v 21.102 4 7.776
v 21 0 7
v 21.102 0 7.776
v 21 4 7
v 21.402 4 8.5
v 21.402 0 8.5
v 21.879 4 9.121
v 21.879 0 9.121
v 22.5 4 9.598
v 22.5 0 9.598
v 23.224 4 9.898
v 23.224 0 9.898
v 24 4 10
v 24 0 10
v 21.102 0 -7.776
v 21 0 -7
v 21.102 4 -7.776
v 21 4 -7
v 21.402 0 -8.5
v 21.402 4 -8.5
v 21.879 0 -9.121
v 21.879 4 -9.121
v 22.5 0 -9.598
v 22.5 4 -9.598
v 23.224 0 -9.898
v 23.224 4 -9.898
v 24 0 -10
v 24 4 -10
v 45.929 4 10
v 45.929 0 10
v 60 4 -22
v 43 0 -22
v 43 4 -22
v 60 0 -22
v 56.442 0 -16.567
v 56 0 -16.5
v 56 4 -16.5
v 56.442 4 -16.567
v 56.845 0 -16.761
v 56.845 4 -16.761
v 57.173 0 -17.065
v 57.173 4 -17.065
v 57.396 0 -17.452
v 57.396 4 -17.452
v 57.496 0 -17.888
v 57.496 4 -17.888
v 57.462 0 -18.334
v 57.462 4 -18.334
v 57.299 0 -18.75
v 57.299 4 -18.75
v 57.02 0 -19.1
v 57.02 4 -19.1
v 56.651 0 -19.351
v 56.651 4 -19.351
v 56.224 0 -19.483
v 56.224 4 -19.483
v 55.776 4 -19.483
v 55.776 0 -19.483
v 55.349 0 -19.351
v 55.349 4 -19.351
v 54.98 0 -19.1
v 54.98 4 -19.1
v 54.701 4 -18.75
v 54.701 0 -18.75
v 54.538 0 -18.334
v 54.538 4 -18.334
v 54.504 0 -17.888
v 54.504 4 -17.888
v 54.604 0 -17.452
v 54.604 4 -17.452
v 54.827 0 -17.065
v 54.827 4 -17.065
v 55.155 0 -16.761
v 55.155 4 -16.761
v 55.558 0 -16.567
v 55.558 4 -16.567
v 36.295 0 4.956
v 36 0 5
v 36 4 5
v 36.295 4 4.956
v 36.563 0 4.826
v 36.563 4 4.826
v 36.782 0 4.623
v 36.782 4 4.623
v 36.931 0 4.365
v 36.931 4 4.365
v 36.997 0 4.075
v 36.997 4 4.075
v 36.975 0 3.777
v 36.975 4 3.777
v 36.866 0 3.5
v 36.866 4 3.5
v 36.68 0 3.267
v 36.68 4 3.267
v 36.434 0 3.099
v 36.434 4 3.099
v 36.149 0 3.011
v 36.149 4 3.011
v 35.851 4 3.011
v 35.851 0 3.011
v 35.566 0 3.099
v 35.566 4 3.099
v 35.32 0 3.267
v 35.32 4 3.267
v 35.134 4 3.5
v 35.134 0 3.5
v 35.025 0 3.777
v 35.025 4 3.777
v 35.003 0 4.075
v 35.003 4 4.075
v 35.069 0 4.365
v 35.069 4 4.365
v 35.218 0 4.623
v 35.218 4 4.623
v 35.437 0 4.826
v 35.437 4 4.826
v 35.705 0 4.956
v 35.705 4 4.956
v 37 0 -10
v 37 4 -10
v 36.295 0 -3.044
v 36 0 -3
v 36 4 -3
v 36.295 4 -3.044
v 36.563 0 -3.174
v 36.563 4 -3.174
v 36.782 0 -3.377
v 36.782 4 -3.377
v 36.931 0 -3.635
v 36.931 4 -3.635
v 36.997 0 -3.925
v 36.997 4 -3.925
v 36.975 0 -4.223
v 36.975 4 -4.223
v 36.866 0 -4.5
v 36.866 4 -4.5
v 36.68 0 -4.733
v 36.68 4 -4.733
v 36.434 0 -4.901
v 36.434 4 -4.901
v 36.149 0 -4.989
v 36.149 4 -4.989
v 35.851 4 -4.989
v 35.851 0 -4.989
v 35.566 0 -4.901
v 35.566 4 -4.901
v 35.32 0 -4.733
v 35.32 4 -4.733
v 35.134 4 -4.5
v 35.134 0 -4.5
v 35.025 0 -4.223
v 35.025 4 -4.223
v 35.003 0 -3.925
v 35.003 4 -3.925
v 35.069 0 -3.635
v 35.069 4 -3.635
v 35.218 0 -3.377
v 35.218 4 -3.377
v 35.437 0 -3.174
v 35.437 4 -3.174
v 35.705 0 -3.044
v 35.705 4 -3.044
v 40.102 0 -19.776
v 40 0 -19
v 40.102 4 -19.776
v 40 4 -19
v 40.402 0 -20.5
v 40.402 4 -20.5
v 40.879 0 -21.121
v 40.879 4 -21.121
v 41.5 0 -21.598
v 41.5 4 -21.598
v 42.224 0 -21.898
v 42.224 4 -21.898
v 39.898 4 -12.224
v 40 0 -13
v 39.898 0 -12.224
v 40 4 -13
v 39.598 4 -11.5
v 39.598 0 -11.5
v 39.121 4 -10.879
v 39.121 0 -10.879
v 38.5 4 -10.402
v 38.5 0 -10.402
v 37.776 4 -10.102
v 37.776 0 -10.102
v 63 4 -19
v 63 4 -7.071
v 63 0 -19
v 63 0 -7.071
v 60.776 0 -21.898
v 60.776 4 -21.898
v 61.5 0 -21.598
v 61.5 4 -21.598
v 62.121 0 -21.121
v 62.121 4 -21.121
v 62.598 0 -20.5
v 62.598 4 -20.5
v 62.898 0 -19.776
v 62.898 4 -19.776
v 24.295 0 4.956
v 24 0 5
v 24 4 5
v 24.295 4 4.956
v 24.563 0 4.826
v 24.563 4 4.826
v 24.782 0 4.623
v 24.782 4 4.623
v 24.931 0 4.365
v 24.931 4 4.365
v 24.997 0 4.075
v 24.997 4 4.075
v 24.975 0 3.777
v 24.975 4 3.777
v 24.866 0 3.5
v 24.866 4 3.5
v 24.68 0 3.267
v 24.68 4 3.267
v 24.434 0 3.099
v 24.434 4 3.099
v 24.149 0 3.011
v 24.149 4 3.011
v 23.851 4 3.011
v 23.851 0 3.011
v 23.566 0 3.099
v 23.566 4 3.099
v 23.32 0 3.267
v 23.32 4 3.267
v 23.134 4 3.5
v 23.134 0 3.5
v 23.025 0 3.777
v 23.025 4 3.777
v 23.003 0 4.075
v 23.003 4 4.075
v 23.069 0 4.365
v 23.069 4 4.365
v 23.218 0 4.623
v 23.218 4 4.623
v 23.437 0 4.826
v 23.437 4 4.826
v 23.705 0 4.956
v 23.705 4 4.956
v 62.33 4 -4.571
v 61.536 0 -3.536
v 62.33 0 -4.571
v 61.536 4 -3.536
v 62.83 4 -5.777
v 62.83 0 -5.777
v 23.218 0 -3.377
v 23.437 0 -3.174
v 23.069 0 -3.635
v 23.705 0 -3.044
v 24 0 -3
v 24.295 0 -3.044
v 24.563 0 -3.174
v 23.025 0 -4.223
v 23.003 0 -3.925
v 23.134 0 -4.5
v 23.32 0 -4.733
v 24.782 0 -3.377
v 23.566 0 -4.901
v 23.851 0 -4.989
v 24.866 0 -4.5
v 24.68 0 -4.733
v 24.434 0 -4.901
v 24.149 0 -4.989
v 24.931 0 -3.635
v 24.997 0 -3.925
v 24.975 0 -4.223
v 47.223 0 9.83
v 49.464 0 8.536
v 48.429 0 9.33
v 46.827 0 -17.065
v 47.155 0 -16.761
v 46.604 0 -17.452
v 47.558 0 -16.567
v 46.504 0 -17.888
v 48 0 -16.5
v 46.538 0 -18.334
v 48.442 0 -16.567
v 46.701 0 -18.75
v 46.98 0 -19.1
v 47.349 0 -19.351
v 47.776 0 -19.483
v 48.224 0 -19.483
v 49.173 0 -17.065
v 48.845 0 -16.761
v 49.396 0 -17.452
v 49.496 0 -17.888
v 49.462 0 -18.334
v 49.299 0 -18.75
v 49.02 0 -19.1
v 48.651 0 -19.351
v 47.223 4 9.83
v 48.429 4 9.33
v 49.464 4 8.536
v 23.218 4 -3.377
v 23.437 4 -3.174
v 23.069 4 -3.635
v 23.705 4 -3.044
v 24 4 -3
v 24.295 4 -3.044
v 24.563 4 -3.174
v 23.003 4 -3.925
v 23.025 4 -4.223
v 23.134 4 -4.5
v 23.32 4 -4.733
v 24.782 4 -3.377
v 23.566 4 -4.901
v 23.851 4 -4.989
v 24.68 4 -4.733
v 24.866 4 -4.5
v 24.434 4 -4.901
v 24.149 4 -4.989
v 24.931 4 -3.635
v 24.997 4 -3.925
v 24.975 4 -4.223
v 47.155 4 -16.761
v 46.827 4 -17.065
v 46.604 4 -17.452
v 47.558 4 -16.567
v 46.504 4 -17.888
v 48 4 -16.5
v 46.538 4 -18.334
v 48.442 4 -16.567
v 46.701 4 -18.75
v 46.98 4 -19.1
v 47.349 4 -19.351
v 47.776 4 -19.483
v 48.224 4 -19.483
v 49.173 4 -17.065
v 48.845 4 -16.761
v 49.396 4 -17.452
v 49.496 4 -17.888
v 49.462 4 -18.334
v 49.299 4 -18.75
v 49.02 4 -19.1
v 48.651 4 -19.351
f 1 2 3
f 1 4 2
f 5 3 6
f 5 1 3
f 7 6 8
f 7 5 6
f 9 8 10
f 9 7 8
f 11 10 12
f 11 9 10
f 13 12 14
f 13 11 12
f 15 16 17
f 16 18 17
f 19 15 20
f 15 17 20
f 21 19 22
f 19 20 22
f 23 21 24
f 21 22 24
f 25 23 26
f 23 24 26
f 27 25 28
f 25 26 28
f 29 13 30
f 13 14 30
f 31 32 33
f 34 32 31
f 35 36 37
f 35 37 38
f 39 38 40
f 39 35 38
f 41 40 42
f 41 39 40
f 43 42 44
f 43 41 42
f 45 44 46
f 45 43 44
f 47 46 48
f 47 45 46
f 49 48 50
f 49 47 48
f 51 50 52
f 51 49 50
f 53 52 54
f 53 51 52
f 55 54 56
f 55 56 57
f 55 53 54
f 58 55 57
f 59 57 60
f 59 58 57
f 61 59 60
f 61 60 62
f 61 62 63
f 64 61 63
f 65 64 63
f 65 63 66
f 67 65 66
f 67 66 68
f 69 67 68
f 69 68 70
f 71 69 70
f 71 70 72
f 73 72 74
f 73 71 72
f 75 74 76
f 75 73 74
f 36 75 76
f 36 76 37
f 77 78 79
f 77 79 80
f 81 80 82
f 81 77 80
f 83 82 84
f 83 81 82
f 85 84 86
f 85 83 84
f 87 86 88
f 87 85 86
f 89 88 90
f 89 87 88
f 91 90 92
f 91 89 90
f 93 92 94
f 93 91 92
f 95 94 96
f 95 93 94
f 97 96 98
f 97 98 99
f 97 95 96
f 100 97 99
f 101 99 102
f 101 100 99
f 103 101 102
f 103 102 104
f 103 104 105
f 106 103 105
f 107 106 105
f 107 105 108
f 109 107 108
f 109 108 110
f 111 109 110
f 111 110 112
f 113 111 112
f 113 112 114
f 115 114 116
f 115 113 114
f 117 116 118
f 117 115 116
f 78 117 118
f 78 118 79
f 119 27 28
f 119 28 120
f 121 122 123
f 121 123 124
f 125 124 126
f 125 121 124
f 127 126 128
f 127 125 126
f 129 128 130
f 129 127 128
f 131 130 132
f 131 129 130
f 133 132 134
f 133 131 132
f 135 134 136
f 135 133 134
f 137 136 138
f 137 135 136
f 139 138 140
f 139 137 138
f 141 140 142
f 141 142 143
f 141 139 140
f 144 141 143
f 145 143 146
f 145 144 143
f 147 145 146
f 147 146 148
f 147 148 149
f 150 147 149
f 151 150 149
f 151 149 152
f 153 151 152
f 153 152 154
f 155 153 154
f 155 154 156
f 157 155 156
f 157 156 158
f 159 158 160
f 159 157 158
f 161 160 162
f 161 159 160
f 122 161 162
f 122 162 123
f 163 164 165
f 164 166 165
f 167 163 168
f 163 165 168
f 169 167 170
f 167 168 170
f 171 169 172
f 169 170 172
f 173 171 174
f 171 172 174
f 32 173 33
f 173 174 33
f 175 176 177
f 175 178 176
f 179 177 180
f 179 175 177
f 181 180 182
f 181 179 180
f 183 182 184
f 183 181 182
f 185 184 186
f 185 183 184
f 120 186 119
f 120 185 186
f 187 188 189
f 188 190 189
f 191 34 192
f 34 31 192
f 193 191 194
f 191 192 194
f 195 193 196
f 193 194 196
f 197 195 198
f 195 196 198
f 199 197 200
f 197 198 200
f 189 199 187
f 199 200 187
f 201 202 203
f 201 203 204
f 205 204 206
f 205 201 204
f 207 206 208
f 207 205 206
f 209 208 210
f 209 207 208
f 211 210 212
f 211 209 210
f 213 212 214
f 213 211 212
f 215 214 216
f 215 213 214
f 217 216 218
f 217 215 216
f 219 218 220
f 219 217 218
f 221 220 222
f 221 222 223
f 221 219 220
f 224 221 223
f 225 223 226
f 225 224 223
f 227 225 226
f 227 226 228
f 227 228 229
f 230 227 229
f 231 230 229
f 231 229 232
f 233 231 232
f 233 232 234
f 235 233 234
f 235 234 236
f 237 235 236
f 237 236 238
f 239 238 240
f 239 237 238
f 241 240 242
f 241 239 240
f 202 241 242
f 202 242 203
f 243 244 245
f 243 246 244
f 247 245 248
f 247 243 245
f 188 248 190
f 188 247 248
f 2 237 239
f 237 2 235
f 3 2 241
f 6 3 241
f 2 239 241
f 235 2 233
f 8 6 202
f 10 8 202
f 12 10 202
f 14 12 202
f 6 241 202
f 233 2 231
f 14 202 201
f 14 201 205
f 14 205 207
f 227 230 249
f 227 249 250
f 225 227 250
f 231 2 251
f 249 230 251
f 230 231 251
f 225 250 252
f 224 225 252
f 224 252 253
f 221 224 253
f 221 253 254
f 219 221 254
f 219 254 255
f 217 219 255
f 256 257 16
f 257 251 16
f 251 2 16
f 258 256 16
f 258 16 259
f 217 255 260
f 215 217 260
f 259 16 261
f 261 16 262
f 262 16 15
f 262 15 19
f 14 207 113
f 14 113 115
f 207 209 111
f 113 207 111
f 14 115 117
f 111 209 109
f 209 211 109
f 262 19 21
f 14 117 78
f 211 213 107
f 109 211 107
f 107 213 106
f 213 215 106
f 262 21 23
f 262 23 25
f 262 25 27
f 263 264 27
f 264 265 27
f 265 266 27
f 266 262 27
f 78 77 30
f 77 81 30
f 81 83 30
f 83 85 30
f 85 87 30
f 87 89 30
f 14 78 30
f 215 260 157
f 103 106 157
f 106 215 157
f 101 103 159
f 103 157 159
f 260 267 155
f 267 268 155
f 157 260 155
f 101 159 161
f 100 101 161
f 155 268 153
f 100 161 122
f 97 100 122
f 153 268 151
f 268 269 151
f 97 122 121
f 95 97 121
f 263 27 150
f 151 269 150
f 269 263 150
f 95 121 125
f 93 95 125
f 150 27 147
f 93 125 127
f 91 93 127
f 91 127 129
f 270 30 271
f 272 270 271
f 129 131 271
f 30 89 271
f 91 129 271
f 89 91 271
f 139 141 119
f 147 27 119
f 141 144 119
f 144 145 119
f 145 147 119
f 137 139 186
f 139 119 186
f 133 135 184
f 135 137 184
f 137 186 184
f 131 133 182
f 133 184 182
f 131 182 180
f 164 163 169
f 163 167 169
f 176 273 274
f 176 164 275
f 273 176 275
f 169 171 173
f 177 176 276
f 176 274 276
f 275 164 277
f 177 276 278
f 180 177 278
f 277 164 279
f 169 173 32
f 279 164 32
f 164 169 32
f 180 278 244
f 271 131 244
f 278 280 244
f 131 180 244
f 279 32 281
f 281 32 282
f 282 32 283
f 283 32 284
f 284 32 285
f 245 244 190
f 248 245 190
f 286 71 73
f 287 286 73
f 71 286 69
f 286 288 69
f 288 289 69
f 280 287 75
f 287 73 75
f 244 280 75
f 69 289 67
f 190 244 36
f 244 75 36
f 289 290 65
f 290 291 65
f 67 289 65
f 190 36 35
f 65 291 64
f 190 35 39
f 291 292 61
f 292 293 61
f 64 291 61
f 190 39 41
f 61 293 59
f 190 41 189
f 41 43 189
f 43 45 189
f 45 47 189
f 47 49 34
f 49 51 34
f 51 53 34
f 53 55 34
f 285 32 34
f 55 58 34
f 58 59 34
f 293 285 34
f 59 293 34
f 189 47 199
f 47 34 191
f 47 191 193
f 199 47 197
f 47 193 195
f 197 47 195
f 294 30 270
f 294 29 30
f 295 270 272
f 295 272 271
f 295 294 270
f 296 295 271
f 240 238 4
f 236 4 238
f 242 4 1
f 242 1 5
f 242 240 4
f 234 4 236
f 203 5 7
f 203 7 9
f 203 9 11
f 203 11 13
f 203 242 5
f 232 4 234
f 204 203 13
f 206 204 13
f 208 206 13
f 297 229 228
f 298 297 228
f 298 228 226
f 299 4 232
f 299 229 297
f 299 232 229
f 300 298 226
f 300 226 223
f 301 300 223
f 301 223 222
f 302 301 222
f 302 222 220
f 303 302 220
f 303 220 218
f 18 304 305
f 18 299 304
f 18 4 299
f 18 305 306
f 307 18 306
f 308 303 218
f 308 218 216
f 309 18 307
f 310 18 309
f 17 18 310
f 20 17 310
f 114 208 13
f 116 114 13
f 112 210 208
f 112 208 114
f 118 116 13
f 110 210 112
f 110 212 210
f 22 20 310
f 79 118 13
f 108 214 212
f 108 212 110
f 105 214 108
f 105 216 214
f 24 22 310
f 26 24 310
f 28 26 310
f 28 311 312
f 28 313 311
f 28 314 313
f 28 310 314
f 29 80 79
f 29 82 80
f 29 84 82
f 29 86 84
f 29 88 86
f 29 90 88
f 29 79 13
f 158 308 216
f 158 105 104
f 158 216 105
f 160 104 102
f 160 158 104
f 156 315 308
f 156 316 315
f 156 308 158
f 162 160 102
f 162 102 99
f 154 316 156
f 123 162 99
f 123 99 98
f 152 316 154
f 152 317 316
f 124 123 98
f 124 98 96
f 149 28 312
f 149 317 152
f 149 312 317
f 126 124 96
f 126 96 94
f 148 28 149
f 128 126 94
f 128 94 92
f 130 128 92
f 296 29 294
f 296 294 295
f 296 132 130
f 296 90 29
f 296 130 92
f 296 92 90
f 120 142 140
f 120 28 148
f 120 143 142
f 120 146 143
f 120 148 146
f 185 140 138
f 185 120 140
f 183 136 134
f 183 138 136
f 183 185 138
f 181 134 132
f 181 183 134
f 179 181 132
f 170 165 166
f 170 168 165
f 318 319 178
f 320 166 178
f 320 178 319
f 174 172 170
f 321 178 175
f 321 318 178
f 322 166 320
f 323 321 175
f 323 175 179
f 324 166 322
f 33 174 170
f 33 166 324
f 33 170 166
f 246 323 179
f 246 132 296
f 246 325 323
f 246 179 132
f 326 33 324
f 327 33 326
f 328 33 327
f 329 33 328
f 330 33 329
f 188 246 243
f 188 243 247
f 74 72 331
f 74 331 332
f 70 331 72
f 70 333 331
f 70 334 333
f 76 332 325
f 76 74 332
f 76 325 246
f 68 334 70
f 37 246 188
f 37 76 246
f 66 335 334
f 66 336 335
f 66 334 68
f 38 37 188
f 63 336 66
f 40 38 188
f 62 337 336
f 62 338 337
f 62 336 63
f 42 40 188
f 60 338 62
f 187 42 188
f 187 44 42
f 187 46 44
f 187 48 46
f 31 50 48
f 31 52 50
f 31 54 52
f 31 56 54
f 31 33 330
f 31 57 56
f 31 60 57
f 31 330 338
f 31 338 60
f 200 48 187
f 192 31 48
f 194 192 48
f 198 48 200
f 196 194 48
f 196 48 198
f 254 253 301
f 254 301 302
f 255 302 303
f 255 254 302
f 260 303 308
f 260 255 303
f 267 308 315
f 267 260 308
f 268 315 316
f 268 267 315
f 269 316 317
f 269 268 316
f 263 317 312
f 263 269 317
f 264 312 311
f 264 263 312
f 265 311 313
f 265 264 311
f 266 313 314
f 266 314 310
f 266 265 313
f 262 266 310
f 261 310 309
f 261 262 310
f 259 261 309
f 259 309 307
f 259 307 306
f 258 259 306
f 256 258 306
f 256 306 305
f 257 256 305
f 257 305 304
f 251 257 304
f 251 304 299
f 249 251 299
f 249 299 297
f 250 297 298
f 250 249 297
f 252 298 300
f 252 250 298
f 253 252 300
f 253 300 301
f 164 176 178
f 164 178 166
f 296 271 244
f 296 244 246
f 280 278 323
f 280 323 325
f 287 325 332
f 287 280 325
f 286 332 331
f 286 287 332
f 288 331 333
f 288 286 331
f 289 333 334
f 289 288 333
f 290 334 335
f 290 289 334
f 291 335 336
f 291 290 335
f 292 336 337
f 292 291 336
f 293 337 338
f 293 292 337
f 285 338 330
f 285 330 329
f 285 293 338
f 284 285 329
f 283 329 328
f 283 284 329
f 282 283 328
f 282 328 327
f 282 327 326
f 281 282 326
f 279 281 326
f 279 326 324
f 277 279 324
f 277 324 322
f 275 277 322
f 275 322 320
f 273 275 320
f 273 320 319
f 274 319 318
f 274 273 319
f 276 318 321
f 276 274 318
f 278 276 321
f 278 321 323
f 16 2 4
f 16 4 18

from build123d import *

# Parameters (mm, degrees)
SKETCH_1_W      = 23
SKETCH_1_H      = 20
SKETCH_1_H_2    = 12
SKETCH_1_R      = 1.5
SKETCH_1_W_2    = 19
SKETCH_1_R_2    = 1
EXTRUDE_1_DEPTH = 4
FILLET_1_R      = 3
CHAMFER_1_SIZE  = 15
FILLET_2_R      = 5


with BuildPart() as part:
    # 草图1 → 凸台-拉伸1 (new body)
    # profile 1 of 3: a face of its own
    with BuildSketch(Plane(origin=(0, 0, 0), x_dir=(1, 0, 0), z_dir=(0, 1, 0))):
        with Locations((51.5, 0)):
            Rectangle(SKETCH_1_W, SKETCH_1_H)
    # profile 2 of 3: a face of its own
    with BuildSketch(Plane(origin=(0, 0, 0), x_dir=(1, 0, 0), z_dir=(0, 1, 0))):
        with Locations((51.5, 16)):
            Rectangle(SKETCH_1_W, SKETCH_1_H_2)
        with Locations(Location((56, 18, 0), (0, 0, 270))):
            Circle(SKETCH_1_R, mode=Mode.SUBTRACT)
        with Locations(Location((48, 18, 0), (0, 0, 270))):
            Circle(SKETCH_1_R, mode=Mode.SUBTRACT)
    # profile 3 of 3: a face of its own
    with BuildSketch(Plane(origin=(0, 0, 0), x_dir=(1, 0, 0), z_dir=(0, 1, 0))):
        with Locations((30.5, 0)):
            Rectangle(SKETCH_1_W_2, SKETCH_1_H)
        with Locations(Location((24, -4, 0), (0, 0, 270))):
            Circle(SKETCH_1_R_2, mode=Mode.SUBTRACT)
        with Locations(Location((36, -4, 0), (0, 0, 270))):
            Circle(SKETCH_1_R_2, mode=Mode.SUBTRACT)
        with Locations(Location((24, 4, 0), (0, 0, 270))):
            Circle(SKETCH_1_R_2, mode=Mode.SUBTRACT)
        with Locations(Location((36, 4, 0), (0, 0, 270))):
            Circle(SKETCH_1_R_2, mode=Mode.SUBTRACT)
    extrude(amount=EXTRUDE_1_DEPTH)

    # 圆角1
    fillet_1_edges = [part.edges().sort_by_distance(p)[0] for p in [
        (21, 2, 10),
        (21, 2, -10),
        (40, 2, -10),
        (40, 2, -22),
        (63, 2, -22),
    ]]
    fillet(fillet_1_edges, radius=FILLET_1_R)

    # 倒角1
    chamfer_1_edges = [part.edges().sort_by_distance(p)[0] for p in [
        (63, 2, 10),
    ]]
    chamfer(chamfer_1_edges, length=CHAMFER_1_SIZE)

    # 圆角2
    fillet_2_edges = [part.edges().sort_by_distance(p)[0] for p in [
        (63, 2, -5),
        (48, 2, 10),
    ]]
    fillet(fillet_2_edges, radius=FILLET_2_R)


solid = part.part
